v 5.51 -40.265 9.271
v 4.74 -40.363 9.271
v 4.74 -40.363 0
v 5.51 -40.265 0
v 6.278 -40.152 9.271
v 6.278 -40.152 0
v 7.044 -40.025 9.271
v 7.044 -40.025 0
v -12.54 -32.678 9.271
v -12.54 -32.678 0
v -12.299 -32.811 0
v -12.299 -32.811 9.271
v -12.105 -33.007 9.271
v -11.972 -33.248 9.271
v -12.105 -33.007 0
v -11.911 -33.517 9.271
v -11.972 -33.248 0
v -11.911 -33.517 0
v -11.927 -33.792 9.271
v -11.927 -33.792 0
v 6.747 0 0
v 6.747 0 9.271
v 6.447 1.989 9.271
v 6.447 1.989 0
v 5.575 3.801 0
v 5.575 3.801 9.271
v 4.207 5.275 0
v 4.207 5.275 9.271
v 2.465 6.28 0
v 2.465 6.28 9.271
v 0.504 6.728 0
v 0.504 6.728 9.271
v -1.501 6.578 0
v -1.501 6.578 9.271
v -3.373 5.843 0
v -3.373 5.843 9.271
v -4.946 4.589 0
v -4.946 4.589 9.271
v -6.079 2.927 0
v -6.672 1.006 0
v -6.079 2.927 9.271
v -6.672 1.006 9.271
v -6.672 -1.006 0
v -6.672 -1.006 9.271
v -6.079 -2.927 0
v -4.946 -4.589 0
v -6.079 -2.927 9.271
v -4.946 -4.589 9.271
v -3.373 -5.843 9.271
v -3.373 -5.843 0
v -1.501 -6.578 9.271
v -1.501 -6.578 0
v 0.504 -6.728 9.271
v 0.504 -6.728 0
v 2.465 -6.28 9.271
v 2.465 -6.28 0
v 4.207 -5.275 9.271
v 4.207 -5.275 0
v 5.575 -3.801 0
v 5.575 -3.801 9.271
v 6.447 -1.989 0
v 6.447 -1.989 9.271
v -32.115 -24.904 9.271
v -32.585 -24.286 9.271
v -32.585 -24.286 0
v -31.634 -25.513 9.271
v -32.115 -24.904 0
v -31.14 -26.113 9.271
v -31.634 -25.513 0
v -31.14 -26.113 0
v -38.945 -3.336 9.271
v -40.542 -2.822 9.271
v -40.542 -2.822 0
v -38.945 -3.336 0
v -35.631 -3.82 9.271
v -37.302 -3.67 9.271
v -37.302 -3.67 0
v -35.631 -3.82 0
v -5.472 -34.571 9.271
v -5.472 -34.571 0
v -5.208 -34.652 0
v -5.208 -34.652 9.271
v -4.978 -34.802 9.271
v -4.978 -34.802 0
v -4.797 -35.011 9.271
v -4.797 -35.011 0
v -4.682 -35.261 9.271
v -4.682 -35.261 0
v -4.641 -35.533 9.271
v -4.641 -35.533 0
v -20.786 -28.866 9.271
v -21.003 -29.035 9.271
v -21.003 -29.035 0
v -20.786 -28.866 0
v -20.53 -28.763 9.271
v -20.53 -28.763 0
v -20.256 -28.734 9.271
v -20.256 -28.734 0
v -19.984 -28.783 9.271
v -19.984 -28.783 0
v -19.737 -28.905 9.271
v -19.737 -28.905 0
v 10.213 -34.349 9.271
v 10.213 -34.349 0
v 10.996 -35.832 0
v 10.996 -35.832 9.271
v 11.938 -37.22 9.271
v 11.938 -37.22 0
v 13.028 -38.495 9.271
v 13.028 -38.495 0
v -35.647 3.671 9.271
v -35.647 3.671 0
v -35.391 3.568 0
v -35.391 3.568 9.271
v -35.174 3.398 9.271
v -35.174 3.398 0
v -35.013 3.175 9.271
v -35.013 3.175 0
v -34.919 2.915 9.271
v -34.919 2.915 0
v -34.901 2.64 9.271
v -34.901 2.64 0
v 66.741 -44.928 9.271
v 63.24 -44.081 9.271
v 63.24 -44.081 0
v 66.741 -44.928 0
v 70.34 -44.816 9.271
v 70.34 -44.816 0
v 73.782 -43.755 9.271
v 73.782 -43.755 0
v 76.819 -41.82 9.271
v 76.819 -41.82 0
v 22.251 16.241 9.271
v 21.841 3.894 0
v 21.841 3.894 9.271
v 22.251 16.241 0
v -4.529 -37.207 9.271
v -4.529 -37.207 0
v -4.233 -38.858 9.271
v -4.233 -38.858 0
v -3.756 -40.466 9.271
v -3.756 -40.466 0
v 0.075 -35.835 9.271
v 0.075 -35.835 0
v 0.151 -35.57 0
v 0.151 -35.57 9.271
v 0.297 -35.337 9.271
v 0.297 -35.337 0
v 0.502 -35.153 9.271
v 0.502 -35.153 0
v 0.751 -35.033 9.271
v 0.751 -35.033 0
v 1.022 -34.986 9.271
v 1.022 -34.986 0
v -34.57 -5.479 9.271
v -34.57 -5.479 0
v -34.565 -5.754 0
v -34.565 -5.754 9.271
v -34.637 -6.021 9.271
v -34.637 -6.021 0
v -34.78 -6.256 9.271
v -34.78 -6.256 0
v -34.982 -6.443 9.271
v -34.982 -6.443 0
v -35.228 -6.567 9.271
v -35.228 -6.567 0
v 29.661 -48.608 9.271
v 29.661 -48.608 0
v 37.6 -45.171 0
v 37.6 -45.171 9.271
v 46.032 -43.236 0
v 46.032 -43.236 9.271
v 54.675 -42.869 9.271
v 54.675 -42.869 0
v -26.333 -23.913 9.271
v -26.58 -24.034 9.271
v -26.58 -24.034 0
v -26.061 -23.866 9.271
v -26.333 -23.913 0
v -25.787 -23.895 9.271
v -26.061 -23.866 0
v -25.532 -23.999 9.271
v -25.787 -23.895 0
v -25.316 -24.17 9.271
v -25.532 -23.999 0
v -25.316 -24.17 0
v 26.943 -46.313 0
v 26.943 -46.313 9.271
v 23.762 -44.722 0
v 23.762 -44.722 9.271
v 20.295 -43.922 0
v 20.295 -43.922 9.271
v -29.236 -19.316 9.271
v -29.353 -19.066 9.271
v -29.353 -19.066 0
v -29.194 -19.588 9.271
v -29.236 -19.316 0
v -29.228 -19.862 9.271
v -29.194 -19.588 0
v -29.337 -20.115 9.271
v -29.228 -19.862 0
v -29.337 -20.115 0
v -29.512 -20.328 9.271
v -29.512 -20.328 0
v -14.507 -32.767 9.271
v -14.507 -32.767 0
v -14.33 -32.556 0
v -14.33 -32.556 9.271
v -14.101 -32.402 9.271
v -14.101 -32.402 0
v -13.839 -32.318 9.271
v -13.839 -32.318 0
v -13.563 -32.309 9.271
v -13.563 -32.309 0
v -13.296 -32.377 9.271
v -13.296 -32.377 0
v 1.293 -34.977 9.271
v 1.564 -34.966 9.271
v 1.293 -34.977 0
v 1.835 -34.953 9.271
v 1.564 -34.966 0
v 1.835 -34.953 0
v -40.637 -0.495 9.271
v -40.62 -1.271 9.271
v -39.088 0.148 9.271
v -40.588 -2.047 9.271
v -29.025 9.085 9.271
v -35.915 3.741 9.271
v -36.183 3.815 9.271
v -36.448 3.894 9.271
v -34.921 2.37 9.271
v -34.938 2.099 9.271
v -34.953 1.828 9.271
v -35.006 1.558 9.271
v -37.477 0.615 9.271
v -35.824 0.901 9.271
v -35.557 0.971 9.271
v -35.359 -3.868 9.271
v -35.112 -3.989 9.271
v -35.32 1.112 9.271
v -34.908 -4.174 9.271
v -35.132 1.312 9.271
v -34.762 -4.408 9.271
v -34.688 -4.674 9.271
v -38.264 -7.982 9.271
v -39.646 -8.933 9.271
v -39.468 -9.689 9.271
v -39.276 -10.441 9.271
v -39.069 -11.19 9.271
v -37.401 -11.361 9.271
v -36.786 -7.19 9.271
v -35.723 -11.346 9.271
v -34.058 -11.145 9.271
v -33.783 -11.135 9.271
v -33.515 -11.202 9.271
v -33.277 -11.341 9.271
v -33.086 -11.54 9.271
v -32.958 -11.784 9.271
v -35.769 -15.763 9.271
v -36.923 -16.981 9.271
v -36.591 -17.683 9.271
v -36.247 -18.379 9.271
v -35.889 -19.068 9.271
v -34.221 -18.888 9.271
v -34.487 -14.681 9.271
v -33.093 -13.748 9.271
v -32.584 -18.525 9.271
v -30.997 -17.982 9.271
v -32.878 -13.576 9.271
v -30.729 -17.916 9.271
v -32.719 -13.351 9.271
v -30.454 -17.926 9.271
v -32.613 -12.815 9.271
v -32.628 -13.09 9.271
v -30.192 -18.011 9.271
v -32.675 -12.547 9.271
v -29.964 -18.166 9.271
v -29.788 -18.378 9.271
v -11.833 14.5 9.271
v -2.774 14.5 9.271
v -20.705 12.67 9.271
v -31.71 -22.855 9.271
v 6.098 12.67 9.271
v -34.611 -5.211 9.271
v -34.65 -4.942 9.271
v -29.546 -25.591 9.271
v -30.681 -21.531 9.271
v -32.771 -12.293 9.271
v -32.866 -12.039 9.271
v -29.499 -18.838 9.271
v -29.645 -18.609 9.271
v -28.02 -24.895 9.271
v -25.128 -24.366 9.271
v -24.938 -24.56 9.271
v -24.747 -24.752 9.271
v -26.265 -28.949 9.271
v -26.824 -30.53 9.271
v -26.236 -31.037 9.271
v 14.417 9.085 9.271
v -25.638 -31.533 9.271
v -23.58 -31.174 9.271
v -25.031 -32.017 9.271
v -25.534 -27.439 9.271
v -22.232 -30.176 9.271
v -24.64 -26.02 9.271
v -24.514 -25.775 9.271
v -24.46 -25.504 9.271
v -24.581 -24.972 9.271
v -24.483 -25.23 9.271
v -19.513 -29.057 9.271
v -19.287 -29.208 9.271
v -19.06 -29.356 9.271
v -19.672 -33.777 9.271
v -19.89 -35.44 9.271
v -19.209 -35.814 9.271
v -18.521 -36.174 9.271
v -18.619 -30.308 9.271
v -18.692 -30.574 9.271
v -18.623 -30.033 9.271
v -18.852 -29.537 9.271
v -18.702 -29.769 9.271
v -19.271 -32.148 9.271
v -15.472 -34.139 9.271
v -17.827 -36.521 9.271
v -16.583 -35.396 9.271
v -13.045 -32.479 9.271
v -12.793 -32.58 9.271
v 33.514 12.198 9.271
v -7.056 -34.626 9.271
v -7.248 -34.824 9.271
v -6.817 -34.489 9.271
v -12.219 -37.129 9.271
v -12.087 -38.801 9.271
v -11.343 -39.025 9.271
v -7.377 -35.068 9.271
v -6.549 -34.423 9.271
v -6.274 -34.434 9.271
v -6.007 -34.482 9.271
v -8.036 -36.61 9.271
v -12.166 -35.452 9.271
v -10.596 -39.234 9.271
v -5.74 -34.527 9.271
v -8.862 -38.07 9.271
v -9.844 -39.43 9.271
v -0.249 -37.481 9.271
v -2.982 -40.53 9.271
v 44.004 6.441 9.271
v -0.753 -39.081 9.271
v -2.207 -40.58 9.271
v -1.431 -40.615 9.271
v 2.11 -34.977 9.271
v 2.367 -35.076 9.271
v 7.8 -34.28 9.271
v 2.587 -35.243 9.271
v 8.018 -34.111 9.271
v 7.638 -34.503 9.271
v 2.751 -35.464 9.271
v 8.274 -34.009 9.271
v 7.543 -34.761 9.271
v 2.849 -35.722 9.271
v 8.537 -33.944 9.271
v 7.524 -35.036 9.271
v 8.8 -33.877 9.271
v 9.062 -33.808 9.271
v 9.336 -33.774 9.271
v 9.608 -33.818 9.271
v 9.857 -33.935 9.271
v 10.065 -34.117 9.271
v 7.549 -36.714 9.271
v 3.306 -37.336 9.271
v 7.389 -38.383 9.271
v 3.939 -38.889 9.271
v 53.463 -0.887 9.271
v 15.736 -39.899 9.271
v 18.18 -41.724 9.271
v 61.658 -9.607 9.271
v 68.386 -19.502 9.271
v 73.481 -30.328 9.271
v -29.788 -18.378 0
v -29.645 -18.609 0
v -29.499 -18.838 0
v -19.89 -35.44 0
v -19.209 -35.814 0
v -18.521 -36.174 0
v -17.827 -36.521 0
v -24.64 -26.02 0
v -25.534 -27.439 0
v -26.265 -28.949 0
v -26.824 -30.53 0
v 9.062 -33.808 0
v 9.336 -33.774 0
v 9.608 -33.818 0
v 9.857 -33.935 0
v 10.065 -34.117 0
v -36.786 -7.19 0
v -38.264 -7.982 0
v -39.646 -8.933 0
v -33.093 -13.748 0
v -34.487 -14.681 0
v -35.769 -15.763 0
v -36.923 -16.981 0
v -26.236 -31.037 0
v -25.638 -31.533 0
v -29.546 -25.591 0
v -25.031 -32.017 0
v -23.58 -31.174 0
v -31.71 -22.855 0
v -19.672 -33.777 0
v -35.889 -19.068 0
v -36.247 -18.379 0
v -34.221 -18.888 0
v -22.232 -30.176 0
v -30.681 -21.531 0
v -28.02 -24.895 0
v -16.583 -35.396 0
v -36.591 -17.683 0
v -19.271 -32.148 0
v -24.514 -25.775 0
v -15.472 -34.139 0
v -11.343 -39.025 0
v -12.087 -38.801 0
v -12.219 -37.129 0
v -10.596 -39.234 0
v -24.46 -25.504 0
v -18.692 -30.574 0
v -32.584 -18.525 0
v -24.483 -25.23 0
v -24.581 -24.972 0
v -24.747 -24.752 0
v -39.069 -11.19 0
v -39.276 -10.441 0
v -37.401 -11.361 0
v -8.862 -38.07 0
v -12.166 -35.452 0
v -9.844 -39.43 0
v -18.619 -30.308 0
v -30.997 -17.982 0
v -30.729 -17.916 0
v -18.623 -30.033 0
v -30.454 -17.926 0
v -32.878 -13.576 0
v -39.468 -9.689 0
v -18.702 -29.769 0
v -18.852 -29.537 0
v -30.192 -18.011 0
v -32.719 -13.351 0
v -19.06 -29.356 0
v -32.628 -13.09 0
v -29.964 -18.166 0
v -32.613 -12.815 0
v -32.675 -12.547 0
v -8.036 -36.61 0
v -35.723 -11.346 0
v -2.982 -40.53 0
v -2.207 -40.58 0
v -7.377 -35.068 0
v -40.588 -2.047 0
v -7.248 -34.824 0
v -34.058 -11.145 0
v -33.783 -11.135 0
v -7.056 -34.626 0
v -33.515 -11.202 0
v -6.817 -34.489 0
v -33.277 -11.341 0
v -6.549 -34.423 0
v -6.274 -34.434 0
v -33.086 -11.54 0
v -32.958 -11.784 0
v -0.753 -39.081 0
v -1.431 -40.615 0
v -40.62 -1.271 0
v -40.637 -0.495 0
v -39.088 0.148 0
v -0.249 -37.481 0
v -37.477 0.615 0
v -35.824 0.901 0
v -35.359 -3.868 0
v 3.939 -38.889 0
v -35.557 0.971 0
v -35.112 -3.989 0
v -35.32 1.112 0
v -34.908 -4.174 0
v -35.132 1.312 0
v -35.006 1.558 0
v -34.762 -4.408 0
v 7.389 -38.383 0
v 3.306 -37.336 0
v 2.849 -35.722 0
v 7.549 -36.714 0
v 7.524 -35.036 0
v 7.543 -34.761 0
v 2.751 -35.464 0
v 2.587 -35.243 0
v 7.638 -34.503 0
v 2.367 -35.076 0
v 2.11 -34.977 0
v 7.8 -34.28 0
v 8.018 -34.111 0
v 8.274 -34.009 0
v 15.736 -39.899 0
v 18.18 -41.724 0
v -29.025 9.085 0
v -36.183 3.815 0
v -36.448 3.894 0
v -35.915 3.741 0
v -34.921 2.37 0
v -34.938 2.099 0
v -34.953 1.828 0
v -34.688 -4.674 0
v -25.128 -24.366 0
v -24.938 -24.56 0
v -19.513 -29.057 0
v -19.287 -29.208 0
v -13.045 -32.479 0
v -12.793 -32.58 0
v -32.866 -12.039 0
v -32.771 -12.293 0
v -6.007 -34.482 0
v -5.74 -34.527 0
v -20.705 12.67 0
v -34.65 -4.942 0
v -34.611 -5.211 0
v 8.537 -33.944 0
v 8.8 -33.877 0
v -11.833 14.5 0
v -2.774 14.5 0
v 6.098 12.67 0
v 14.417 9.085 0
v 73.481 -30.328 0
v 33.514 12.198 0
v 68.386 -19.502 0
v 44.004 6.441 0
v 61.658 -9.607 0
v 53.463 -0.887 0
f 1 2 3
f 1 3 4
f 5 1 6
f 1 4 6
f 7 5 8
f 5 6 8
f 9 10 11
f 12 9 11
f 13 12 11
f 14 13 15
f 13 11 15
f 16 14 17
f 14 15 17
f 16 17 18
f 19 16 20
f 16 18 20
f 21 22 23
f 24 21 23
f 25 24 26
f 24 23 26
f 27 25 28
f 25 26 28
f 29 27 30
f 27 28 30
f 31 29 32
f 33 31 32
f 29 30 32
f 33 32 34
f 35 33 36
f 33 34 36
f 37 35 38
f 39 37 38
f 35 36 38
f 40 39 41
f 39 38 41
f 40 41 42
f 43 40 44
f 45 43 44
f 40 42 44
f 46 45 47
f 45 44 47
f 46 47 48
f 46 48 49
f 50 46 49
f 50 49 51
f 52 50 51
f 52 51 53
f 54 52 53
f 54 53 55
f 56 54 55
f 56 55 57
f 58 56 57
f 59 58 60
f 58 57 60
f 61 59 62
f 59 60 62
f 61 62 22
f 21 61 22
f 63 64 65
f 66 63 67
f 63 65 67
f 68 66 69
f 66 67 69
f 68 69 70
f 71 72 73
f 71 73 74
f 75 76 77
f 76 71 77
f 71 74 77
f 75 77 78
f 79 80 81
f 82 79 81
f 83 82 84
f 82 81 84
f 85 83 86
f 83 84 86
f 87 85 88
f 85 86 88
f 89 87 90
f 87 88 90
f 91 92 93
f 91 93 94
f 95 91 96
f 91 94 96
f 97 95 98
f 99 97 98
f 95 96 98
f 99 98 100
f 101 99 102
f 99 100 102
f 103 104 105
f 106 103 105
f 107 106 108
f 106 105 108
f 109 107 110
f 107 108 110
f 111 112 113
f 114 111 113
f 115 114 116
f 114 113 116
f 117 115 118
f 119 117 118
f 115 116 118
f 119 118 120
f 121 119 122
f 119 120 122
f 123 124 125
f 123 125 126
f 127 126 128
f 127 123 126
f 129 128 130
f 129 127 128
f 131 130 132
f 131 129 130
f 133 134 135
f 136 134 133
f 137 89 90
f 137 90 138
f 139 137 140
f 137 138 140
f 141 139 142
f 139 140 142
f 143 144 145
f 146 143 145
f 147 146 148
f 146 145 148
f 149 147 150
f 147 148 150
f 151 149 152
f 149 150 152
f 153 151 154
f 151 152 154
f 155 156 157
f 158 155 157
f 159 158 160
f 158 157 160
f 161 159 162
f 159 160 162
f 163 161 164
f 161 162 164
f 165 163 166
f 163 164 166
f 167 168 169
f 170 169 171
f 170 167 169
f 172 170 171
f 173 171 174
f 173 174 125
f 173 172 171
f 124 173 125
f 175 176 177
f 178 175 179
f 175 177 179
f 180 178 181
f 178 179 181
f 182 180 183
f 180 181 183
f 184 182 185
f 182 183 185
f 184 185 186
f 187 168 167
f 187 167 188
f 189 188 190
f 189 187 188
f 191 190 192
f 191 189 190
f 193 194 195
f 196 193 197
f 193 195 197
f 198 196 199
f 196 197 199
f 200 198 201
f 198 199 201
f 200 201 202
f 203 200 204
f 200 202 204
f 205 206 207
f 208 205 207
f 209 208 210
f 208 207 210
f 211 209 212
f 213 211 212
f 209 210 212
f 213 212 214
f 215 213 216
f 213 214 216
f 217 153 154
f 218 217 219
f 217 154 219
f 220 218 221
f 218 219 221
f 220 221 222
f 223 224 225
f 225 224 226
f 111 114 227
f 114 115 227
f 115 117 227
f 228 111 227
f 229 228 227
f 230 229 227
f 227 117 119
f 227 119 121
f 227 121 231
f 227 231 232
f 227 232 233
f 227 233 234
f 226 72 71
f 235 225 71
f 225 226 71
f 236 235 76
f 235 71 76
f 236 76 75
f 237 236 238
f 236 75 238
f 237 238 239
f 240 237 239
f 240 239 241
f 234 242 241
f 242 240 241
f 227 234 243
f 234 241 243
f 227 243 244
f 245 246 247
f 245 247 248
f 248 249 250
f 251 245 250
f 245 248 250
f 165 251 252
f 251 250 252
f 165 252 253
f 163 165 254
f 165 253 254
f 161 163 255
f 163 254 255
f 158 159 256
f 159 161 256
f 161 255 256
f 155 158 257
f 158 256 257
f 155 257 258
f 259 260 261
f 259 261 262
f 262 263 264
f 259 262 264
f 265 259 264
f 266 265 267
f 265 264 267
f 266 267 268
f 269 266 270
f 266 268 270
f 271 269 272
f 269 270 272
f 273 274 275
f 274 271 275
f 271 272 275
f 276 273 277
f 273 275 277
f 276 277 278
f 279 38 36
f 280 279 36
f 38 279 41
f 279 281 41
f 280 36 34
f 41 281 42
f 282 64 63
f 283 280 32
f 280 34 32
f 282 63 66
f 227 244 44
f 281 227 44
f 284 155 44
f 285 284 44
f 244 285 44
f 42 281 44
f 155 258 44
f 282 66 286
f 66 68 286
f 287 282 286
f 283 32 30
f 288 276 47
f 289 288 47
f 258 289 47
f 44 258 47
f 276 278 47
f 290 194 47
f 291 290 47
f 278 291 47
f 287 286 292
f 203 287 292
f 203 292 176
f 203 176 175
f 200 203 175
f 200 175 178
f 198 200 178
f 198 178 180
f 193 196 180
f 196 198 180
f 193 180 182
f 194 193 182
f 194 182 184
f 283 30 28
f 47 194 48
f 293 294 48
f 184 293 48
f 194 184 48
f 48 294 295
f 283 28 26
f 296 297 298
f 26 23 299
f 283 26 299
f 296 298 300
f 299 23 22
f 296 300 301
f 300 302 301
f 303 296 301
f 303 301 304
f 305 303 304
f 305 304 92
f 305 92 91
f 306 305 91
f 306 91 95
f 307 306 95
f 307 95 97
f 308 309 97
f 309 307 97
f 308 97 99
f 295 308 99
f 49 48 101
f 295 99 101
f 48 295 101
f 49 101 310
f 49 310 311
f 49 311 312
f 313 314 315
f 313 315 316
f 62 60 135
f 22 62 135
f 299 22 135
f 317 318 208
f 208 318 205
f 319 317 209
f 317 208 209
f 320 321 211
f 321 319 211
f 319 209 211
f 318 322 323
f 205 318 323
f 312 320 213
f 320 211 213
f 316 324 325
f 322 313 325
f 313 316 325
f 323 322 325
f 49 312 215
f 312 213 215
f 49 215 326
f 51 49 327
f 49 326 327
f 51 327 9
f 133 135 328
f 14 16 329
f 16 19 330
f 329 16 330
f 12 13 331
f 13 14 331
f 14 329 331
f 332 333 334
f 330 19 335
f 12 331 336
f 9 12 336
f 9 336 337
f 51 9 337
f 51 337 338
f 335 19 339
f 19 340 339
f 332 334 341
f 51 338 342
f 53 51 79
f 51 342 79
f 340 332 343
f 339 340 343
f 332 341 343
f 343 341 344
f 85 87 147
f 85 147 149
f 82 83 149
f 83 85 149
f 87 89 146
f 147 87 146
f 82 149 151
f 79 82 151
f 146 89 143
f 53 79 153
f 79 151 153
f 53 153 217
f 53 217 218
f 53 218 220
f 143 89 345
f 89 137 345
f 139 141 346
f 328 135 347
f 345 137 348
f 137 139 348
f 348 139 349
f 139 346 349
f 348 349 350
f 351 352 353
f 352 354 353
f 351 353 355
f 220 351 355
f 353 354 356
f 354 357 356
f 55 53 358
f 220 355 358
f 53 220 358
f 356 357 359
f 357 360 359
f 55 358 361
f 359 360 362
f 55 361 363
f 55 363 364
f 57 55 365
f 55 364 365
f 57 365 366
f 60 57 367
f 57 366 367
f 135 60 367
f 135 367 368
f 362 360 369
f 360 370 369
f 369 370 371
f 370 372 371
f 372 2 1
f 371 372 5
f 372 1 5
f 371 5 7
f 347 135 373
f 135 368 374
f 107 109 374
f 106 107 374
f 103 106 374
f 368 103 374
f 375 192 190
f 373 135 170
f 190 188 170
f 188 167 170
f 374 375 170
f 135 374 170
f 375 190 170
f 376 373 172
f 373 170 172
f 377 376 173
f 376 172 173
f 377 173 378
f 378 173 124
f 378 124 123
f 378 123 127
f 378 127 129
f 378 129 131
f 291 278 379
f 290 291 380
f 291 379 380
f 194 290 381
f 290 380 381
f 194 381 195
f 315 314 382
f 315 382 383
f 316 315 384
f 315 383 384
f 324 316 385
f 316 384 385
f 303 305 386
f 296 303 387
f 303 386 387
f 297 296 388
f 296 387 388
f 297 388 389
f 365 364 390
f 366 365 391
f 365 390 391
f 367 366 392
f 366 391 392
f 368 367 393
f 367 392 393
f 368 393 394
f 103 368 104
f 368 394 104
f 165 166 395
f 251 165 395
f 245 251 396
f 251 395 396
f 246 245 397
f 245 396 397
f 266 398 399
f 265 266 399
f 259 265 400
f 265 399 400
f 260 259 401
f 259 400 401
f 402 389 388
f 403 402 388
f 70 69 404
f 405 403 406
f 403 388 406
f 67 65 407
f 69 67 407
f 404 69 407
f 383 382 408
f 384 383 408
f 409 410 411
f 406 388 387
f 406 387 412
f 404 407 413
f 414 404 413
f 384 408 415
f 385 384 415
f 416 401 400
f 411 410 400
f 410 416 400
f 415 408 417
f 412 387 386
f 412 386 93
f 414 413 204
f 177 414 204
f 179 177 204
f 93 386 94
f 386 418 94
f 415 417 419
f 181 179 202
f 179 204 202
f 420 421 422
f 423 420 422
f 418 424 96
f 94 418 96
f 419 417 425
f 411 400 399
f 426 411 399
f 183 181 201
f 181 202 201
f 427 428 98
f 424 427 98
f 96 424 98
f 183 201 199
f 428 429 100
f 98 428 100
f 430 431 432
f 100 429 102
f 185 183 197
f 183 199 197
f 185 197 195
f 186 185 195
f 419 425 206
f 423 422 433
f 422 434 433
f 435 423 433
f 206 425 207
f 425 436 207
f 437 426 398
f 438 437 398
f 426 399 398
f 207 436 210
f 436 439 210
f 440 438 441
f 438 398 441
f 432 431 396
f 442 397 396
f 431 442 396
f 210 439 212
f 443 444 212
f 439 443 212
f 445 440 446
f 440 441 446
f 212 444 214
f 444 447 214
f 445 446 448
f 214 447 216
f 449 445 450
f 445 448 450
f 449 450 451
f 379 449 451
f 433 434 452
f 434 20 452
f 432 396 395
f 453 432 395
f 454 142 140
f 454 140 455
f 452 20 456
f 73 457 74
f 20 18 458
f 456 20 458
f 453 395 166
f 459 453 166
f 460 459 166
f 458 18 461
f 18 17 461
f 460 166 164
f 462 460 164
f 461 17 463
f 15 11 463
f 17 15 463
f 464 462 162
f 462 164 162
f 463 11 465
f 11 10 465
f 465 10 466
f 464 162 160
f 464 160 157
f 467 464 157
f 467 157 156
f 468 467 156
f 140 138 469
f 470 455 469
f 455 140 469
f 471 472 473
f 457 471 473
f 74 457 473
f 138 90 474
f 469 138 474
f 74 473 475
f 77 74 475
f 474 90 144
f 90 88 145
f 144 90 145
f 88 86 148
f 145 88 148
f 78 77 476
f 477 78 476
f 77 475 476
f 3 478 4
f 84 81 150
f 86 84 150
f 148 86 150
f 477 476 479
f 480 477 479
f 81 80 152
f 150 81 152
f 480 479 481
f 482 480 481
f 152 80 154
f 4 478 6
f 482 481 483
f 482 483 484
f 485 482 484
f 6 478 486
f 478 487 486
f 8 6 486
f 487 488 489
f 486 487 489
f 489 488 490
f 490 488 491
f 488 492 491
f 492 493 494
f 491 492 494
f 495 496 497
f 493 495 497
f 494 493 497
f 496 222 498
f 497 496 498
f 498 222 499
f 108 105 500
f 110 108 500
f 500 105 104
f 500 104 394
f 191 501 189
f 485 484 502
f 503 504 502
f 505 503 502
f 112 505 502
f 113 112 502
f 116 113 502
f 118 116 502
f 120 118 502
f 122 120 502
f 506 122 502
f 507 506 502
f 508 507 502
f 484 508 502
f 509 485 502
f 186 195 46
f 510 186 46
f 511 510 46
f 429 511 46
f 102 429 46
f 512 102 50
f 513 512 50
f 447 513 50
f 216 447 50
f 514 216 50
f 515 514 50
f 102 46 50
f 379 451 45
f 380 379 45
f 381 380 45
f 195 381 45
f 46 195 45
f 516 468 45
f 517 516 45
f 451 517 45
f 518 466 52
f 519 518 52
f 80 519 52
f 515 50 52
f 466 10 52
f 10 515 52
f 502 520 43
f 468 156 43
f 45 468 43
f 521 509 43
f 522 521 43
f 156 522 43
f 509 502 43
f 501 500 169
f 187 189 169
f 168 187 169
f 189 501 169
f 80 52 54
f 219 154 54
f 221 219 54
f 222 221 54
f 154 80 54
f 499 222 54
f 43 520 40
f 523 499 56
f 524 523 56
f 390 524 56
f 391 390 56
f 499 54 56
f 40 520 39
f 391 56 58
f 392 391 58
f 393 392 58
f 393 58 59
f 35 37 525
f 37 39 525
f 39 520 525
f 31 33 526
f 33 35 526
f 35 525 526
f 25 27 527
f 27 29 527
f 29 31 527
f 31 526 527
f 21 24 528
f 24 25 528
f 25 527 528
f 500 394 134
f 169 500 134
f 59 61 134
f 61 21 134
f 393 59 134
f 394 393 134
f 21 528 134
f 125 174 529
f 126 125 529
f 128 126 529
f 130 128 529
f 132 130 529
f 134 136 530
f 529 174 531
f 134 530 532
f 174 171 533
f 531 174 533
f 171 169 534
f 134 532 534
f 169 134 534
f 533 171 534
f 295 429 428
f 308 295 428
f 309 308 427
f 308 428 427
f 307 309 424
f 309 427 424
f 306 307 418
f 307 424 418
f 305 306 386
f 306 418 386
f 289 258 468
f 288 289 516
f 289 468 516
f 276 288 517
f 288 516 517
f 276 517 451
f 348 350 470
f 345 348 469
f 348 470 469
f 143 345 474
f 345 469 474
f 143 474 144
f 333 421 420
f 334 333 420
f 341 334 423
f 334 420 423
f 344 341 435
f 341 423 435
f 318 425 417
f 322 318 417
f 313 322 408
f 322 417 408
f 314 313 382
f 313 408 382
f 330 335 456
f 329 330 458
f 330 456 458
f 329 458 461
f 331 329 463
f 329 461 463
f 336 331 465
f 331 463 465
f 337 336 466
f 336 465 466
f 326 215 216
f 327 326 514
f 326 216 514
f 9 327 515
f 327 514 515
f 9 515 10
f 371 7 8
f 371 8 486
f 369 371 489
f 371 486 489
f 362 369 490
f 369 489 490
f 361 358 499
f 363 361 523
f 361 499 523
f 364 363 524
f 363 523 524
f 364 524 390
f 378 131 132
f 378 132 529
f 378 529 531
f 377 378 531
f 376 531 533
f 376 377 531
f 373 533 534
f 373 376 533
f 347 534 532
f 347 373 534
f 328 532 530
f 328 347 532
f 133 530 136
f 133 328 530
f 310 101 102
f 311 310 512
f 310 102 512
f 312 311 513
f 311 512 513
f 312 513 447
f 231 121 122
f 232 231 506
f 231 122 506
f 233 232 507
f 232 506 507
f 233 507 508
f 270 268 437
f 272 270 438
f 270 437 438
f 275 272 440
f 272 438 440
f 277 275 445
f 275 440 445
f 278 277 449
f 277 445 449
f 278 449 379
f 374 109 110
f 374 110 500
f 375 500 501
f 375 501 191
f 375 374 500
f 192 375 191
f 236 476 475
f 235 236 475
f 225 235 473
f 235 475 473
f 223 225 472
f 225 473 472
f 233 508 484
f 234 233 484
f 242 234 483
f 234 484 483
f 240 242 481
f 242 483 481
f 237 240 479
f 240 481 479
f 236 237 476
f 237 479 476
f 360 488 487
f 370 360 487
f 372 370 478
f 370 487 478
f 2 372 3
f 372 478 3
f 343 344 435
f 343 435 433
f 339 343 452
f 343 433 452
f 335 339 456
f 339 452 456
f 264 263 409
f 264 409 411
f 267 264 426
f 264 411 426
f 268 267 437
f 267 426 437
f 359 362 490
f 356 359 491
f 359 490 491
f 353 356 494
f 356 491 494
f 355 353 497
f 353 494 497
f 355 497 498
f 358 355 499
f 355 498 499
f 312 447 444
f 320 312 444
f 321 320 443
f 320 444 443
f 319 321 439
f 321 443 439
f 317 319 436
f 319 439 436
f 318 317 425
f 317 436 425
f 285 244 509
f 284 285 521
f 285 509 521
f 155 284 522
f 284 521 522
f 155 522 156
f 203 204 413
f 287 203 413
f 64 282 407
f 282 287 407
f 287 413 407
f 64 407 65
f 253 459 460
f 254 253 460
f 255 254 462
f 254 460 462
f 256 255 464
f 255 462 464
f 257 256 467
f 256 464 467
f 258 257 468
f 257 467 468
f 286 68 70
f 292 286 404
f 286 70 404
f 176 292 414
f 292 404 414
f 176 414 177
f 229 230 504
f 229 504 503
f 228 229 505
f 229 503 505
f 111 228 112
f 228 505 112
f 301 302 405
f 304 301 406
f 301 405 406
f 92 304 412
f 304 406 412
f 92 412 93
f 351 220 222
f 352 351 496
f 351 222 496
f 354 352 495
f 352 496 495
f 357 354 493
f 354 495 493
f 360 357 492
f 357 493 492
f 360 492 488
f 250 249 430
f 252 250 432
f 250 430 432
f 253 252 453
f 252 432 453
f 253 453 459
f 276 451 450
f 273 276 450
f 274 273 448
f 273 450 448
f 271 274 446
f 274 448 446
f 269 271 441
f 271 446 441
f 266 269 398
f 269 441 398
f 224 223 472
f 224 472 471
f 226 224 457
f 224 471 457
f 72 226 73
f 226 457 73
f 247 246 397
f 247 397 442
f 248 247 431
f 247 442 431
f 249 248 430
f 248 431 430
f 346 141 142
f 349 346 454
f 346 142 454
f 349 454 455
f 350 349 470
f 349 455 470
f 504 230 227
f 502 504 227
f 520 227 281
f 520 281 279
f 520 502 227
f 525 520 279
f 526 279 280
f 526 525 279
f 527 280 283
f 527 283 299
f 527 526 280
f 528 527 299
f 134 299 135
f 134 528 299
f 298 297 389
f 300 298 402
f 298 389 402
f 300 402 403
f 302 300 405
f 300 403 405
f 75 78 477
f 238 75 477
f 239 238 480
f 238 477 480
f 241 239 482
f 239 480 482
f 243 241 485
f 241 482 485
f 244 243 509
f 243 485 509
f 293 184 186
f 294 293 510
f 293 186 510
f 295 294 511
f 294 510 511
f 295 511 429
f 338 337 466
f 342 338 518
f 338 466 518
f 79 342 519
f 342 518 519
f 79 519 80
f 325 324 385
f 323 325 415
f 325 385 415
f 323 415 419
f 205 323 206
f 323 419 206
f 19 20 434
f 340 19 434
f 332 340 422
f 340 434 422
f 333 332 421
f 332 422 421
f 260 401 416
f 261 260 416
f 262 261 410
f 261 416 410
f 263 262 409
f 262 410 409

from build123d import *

# Parameters (mm, degrees)
SKETCH3_R               = 40.64
GEARBODY_DEPTH          = 25.4
TOOTHCUT_DEPTH          = 63.836129734
CIRPATTERN1_COUNT       = 30
BOREDIA_R               = 9.525
BORE_DEPTH              = 12700
CUT_EXTRUDE1_DEPTH      = 63.817881856
BOSS_EXTRUDE1_DEPTH     = 25.4
CUT_EXTRUDE2_DEPTH      = 97.248090867
CUT_EXTRUDE2_DEPTH_BACK = 97.248090867
CUT_EXTRUDE3_DEPTH      = 94.297837255
CUT_EXTRUDE3_DEPTH_BACK = 94.297837255
SKETCH8_R               = 10.901188975
SKETCH8_R_2             = 6.746875
BOSS_EXTRUDE2_DEPTH     = 9.271
CUT_EXTRUDE4_DEPTH      = 94.297837255
CUT_EXTRUDE4_DEPTH_BACK = 94.297837255


with BuildPart() as part:
    # Sketch3 → gearBody (new body)
    with BuildSketch(Plane.XY):
        Circle(SKETCH3_R)
    extrude(amount=GEARBODY_DEPTH)

    # Sketch2 → toothCut (cut, through all)
    with BuildSketch(Plane.XY):
        with BuildLine():
            ThreePointArc((34.901466352, -2.640387833), (34.929801576, -2.234493965), (34.953416534, -1.828298136))
            ThreePointArc((34.953416534, -1.828298136), (35.218972856, -1.205360668), (35.823821616, -0.900845929))
            ThreePointArc((35.823821616, -0.900845929), (41.902420255, 1.180053047), (46.567899911, 5.597382731))
            ThreePointArc((46.567899911, 5.597382731), (46.807414621, -2.994316622), (45.4750933, -11.485464069))
            ThreePointArc((45.4750933, -11.485464069), (41.410501506, -6.509663078), (35.646600115, -3.671187658))
            ThreePointArc((35.646600115, -3.671187658), (35.08548304, -3.292084932), (34.901466352, -2.640387833))
        make_face()
    toothcut = extrude(amount=TOOTHCUT_DEPTH, mode=Mode.SUBTRACT)

    # CirPattern1: toothCut ×30 about axis
    cirpattern1_axis = Axis((0, 0, 0), (0, 0, 1))
    for i in range(1, CIRPATTERN1_COUNT):
        add(toothcut.rotate(cirpattern1_axis, i * 360 / CIRPATTERN1_COUNT), mode=Mode.SUBTRACT)

    # boreDia → bore (cut, symmetric)
    with BuildSketch(Plane.XY):
        Circle(BOREDIA_R)
    extrude(amount=BORE_DEPTH, both=True, mode=Mode.SUBTRACT)

    # Sketch4 → Cut-Extrude1 (cut, through all)
    with BuildSketch(Plane.XY.offset(25.4)):
        with BuildLine():
            ThreePointArc((-43.554352266, 3.655257975), (1.299887875, 18.694416006), (46.382242057, 4.353548725))
            ThreePointArc((46.382242057, 4.353548725), (1.078287813, 47.235471327), (-43.554352266, 3.655257975))
        make_face()
    extrude(amount=-CUT_EXTRUDE1_DEPTH, mode=Mode.SUBTRACT)

    # Sketch5 → Boss-Extrude1 (add)
    with BuildSketch(Plane.XY.offset(25.4)):
        with BuildLine():
            Line((-40.520407877, 5.797825642), (17.717099168, 12.48871132))
            Line((17.717099168, 12.48871132), (8.960832095, -26.928019276))
            Line((8.960832095, -26.928019276), (13.028048789, -38.495188592))
            ThreePointArc((13.028048789, -38.495188592), (20.295398902, -43.922390287), (24.158608262, -52.128760334))
            ThreePointArc((24.158608262, -52.128760334), (42.8096102, -43.78426266), (63.240034891, -44.081351255))
            ThreePointArc((63.240034891, -44.081351255), (70.340218446, -44.816365594), (76.818795497, -41.819551953))
            ThreePointArc((76.818795497, -41.819551953), (30.86783196, 13.330528242), (-40.520407877, 5.797825642))
        make_face()
    extrude(amount=-BOSS_EXTRUDE1_DEPTH)

    # Sketch6 → Cut-Extrude2 (cut, two sides: drawn at the far end of the back side and taken through both)
    with BuildSketch(Plane(origin=(0, 0, 0), x_dir=(1, 0, 0), z_dir=(0, 1, 0)).offset(-CUT_EXTRUDE2_DEPTH_BACK)):
        Polygon((-46.138376309, -9.271), (97.816171298, -9.271), (71.932802696, -41.15378122), (-48.678279579, -38.064709676), align=None)
    extrude(amount=CUT_EXTRUDE2_DEPTH + CUT_EXTRUDE2_DEPTH_BACK, mode=Mode.SUBTRACT)

    # Sketch7 → Cut-Extrude3 (cut, two sides: drawn at the far end of the back side and taken through both)
    with BuildSketch(Plane.XY.offset(9.271).offset(-CUT_EXTRUDE3_DEPTH_BACK)):
        with BuildLine():
            Line((21.841106952, 3.893976142), (22.251299285, 16.241253613))
            Line((22.251299285, 16.241253613), (23.901139449, 23.204831581))
            Line((23.901139449, 23.204831581), (-36.876630256, 21.261551183))
            Line((-36.876630256, 21.261551183), (-43.577597148, 3.302959913))
            Line((-43.577597148, 3.302959913), (-36.448484964, 3.893976142))
            ThreePointArc((-36.448484964, 3.893976142), (-7.303689006, 14.730432769), (21.841106952, 3.893976142))
        make_face()
    extrude(amount=CUT_EXTRUDE3_DEPTH + CUT_EXTRUDE3_DEPTH_BACK, mode=Mode.SUBTRACT)

    # Sketch8 → Boss-Extrude2 (add)
    with BuildSketch(Plane.XY.offset(9.271)):
        Circle(SKETCH8_R)
        Circle(SKETCH8_R_2, mode=Mode.SUBTRACT)
    extrude(amount=-BOSS_EXTRUDE2_DEPTH)

    # Sketch9 → Cut-Extrude4 (cut, two sides: drawn at the far end of the back side and taken through both)
    with BuildSketch(Plane.XY.offset(9.271).offset(-CUT_EXTRUDE4_DEPTH_BACK)):
        with BuildLine():
            Line((20.295398902, -43.922390287), (23.1683449, -52.694459817))
            Line((23.1683449, -52.694459817), (26.579367988, -52.803988081))
            Line((26.579367988, -52.803988081), (29.661056762, -48.607867727))
            ThreePointArc((29.661056762, -48.607867727), (25.399491401, -45.423078115), (20.295398902, -43.922390287))
        make_face()
    extrude(amount=CUT_EXTRUDE4_DEPTH + CUT_EXTRUDE4_DEPTH_BACK, mode=Mode.SUBTRACT)


solid = part.part
